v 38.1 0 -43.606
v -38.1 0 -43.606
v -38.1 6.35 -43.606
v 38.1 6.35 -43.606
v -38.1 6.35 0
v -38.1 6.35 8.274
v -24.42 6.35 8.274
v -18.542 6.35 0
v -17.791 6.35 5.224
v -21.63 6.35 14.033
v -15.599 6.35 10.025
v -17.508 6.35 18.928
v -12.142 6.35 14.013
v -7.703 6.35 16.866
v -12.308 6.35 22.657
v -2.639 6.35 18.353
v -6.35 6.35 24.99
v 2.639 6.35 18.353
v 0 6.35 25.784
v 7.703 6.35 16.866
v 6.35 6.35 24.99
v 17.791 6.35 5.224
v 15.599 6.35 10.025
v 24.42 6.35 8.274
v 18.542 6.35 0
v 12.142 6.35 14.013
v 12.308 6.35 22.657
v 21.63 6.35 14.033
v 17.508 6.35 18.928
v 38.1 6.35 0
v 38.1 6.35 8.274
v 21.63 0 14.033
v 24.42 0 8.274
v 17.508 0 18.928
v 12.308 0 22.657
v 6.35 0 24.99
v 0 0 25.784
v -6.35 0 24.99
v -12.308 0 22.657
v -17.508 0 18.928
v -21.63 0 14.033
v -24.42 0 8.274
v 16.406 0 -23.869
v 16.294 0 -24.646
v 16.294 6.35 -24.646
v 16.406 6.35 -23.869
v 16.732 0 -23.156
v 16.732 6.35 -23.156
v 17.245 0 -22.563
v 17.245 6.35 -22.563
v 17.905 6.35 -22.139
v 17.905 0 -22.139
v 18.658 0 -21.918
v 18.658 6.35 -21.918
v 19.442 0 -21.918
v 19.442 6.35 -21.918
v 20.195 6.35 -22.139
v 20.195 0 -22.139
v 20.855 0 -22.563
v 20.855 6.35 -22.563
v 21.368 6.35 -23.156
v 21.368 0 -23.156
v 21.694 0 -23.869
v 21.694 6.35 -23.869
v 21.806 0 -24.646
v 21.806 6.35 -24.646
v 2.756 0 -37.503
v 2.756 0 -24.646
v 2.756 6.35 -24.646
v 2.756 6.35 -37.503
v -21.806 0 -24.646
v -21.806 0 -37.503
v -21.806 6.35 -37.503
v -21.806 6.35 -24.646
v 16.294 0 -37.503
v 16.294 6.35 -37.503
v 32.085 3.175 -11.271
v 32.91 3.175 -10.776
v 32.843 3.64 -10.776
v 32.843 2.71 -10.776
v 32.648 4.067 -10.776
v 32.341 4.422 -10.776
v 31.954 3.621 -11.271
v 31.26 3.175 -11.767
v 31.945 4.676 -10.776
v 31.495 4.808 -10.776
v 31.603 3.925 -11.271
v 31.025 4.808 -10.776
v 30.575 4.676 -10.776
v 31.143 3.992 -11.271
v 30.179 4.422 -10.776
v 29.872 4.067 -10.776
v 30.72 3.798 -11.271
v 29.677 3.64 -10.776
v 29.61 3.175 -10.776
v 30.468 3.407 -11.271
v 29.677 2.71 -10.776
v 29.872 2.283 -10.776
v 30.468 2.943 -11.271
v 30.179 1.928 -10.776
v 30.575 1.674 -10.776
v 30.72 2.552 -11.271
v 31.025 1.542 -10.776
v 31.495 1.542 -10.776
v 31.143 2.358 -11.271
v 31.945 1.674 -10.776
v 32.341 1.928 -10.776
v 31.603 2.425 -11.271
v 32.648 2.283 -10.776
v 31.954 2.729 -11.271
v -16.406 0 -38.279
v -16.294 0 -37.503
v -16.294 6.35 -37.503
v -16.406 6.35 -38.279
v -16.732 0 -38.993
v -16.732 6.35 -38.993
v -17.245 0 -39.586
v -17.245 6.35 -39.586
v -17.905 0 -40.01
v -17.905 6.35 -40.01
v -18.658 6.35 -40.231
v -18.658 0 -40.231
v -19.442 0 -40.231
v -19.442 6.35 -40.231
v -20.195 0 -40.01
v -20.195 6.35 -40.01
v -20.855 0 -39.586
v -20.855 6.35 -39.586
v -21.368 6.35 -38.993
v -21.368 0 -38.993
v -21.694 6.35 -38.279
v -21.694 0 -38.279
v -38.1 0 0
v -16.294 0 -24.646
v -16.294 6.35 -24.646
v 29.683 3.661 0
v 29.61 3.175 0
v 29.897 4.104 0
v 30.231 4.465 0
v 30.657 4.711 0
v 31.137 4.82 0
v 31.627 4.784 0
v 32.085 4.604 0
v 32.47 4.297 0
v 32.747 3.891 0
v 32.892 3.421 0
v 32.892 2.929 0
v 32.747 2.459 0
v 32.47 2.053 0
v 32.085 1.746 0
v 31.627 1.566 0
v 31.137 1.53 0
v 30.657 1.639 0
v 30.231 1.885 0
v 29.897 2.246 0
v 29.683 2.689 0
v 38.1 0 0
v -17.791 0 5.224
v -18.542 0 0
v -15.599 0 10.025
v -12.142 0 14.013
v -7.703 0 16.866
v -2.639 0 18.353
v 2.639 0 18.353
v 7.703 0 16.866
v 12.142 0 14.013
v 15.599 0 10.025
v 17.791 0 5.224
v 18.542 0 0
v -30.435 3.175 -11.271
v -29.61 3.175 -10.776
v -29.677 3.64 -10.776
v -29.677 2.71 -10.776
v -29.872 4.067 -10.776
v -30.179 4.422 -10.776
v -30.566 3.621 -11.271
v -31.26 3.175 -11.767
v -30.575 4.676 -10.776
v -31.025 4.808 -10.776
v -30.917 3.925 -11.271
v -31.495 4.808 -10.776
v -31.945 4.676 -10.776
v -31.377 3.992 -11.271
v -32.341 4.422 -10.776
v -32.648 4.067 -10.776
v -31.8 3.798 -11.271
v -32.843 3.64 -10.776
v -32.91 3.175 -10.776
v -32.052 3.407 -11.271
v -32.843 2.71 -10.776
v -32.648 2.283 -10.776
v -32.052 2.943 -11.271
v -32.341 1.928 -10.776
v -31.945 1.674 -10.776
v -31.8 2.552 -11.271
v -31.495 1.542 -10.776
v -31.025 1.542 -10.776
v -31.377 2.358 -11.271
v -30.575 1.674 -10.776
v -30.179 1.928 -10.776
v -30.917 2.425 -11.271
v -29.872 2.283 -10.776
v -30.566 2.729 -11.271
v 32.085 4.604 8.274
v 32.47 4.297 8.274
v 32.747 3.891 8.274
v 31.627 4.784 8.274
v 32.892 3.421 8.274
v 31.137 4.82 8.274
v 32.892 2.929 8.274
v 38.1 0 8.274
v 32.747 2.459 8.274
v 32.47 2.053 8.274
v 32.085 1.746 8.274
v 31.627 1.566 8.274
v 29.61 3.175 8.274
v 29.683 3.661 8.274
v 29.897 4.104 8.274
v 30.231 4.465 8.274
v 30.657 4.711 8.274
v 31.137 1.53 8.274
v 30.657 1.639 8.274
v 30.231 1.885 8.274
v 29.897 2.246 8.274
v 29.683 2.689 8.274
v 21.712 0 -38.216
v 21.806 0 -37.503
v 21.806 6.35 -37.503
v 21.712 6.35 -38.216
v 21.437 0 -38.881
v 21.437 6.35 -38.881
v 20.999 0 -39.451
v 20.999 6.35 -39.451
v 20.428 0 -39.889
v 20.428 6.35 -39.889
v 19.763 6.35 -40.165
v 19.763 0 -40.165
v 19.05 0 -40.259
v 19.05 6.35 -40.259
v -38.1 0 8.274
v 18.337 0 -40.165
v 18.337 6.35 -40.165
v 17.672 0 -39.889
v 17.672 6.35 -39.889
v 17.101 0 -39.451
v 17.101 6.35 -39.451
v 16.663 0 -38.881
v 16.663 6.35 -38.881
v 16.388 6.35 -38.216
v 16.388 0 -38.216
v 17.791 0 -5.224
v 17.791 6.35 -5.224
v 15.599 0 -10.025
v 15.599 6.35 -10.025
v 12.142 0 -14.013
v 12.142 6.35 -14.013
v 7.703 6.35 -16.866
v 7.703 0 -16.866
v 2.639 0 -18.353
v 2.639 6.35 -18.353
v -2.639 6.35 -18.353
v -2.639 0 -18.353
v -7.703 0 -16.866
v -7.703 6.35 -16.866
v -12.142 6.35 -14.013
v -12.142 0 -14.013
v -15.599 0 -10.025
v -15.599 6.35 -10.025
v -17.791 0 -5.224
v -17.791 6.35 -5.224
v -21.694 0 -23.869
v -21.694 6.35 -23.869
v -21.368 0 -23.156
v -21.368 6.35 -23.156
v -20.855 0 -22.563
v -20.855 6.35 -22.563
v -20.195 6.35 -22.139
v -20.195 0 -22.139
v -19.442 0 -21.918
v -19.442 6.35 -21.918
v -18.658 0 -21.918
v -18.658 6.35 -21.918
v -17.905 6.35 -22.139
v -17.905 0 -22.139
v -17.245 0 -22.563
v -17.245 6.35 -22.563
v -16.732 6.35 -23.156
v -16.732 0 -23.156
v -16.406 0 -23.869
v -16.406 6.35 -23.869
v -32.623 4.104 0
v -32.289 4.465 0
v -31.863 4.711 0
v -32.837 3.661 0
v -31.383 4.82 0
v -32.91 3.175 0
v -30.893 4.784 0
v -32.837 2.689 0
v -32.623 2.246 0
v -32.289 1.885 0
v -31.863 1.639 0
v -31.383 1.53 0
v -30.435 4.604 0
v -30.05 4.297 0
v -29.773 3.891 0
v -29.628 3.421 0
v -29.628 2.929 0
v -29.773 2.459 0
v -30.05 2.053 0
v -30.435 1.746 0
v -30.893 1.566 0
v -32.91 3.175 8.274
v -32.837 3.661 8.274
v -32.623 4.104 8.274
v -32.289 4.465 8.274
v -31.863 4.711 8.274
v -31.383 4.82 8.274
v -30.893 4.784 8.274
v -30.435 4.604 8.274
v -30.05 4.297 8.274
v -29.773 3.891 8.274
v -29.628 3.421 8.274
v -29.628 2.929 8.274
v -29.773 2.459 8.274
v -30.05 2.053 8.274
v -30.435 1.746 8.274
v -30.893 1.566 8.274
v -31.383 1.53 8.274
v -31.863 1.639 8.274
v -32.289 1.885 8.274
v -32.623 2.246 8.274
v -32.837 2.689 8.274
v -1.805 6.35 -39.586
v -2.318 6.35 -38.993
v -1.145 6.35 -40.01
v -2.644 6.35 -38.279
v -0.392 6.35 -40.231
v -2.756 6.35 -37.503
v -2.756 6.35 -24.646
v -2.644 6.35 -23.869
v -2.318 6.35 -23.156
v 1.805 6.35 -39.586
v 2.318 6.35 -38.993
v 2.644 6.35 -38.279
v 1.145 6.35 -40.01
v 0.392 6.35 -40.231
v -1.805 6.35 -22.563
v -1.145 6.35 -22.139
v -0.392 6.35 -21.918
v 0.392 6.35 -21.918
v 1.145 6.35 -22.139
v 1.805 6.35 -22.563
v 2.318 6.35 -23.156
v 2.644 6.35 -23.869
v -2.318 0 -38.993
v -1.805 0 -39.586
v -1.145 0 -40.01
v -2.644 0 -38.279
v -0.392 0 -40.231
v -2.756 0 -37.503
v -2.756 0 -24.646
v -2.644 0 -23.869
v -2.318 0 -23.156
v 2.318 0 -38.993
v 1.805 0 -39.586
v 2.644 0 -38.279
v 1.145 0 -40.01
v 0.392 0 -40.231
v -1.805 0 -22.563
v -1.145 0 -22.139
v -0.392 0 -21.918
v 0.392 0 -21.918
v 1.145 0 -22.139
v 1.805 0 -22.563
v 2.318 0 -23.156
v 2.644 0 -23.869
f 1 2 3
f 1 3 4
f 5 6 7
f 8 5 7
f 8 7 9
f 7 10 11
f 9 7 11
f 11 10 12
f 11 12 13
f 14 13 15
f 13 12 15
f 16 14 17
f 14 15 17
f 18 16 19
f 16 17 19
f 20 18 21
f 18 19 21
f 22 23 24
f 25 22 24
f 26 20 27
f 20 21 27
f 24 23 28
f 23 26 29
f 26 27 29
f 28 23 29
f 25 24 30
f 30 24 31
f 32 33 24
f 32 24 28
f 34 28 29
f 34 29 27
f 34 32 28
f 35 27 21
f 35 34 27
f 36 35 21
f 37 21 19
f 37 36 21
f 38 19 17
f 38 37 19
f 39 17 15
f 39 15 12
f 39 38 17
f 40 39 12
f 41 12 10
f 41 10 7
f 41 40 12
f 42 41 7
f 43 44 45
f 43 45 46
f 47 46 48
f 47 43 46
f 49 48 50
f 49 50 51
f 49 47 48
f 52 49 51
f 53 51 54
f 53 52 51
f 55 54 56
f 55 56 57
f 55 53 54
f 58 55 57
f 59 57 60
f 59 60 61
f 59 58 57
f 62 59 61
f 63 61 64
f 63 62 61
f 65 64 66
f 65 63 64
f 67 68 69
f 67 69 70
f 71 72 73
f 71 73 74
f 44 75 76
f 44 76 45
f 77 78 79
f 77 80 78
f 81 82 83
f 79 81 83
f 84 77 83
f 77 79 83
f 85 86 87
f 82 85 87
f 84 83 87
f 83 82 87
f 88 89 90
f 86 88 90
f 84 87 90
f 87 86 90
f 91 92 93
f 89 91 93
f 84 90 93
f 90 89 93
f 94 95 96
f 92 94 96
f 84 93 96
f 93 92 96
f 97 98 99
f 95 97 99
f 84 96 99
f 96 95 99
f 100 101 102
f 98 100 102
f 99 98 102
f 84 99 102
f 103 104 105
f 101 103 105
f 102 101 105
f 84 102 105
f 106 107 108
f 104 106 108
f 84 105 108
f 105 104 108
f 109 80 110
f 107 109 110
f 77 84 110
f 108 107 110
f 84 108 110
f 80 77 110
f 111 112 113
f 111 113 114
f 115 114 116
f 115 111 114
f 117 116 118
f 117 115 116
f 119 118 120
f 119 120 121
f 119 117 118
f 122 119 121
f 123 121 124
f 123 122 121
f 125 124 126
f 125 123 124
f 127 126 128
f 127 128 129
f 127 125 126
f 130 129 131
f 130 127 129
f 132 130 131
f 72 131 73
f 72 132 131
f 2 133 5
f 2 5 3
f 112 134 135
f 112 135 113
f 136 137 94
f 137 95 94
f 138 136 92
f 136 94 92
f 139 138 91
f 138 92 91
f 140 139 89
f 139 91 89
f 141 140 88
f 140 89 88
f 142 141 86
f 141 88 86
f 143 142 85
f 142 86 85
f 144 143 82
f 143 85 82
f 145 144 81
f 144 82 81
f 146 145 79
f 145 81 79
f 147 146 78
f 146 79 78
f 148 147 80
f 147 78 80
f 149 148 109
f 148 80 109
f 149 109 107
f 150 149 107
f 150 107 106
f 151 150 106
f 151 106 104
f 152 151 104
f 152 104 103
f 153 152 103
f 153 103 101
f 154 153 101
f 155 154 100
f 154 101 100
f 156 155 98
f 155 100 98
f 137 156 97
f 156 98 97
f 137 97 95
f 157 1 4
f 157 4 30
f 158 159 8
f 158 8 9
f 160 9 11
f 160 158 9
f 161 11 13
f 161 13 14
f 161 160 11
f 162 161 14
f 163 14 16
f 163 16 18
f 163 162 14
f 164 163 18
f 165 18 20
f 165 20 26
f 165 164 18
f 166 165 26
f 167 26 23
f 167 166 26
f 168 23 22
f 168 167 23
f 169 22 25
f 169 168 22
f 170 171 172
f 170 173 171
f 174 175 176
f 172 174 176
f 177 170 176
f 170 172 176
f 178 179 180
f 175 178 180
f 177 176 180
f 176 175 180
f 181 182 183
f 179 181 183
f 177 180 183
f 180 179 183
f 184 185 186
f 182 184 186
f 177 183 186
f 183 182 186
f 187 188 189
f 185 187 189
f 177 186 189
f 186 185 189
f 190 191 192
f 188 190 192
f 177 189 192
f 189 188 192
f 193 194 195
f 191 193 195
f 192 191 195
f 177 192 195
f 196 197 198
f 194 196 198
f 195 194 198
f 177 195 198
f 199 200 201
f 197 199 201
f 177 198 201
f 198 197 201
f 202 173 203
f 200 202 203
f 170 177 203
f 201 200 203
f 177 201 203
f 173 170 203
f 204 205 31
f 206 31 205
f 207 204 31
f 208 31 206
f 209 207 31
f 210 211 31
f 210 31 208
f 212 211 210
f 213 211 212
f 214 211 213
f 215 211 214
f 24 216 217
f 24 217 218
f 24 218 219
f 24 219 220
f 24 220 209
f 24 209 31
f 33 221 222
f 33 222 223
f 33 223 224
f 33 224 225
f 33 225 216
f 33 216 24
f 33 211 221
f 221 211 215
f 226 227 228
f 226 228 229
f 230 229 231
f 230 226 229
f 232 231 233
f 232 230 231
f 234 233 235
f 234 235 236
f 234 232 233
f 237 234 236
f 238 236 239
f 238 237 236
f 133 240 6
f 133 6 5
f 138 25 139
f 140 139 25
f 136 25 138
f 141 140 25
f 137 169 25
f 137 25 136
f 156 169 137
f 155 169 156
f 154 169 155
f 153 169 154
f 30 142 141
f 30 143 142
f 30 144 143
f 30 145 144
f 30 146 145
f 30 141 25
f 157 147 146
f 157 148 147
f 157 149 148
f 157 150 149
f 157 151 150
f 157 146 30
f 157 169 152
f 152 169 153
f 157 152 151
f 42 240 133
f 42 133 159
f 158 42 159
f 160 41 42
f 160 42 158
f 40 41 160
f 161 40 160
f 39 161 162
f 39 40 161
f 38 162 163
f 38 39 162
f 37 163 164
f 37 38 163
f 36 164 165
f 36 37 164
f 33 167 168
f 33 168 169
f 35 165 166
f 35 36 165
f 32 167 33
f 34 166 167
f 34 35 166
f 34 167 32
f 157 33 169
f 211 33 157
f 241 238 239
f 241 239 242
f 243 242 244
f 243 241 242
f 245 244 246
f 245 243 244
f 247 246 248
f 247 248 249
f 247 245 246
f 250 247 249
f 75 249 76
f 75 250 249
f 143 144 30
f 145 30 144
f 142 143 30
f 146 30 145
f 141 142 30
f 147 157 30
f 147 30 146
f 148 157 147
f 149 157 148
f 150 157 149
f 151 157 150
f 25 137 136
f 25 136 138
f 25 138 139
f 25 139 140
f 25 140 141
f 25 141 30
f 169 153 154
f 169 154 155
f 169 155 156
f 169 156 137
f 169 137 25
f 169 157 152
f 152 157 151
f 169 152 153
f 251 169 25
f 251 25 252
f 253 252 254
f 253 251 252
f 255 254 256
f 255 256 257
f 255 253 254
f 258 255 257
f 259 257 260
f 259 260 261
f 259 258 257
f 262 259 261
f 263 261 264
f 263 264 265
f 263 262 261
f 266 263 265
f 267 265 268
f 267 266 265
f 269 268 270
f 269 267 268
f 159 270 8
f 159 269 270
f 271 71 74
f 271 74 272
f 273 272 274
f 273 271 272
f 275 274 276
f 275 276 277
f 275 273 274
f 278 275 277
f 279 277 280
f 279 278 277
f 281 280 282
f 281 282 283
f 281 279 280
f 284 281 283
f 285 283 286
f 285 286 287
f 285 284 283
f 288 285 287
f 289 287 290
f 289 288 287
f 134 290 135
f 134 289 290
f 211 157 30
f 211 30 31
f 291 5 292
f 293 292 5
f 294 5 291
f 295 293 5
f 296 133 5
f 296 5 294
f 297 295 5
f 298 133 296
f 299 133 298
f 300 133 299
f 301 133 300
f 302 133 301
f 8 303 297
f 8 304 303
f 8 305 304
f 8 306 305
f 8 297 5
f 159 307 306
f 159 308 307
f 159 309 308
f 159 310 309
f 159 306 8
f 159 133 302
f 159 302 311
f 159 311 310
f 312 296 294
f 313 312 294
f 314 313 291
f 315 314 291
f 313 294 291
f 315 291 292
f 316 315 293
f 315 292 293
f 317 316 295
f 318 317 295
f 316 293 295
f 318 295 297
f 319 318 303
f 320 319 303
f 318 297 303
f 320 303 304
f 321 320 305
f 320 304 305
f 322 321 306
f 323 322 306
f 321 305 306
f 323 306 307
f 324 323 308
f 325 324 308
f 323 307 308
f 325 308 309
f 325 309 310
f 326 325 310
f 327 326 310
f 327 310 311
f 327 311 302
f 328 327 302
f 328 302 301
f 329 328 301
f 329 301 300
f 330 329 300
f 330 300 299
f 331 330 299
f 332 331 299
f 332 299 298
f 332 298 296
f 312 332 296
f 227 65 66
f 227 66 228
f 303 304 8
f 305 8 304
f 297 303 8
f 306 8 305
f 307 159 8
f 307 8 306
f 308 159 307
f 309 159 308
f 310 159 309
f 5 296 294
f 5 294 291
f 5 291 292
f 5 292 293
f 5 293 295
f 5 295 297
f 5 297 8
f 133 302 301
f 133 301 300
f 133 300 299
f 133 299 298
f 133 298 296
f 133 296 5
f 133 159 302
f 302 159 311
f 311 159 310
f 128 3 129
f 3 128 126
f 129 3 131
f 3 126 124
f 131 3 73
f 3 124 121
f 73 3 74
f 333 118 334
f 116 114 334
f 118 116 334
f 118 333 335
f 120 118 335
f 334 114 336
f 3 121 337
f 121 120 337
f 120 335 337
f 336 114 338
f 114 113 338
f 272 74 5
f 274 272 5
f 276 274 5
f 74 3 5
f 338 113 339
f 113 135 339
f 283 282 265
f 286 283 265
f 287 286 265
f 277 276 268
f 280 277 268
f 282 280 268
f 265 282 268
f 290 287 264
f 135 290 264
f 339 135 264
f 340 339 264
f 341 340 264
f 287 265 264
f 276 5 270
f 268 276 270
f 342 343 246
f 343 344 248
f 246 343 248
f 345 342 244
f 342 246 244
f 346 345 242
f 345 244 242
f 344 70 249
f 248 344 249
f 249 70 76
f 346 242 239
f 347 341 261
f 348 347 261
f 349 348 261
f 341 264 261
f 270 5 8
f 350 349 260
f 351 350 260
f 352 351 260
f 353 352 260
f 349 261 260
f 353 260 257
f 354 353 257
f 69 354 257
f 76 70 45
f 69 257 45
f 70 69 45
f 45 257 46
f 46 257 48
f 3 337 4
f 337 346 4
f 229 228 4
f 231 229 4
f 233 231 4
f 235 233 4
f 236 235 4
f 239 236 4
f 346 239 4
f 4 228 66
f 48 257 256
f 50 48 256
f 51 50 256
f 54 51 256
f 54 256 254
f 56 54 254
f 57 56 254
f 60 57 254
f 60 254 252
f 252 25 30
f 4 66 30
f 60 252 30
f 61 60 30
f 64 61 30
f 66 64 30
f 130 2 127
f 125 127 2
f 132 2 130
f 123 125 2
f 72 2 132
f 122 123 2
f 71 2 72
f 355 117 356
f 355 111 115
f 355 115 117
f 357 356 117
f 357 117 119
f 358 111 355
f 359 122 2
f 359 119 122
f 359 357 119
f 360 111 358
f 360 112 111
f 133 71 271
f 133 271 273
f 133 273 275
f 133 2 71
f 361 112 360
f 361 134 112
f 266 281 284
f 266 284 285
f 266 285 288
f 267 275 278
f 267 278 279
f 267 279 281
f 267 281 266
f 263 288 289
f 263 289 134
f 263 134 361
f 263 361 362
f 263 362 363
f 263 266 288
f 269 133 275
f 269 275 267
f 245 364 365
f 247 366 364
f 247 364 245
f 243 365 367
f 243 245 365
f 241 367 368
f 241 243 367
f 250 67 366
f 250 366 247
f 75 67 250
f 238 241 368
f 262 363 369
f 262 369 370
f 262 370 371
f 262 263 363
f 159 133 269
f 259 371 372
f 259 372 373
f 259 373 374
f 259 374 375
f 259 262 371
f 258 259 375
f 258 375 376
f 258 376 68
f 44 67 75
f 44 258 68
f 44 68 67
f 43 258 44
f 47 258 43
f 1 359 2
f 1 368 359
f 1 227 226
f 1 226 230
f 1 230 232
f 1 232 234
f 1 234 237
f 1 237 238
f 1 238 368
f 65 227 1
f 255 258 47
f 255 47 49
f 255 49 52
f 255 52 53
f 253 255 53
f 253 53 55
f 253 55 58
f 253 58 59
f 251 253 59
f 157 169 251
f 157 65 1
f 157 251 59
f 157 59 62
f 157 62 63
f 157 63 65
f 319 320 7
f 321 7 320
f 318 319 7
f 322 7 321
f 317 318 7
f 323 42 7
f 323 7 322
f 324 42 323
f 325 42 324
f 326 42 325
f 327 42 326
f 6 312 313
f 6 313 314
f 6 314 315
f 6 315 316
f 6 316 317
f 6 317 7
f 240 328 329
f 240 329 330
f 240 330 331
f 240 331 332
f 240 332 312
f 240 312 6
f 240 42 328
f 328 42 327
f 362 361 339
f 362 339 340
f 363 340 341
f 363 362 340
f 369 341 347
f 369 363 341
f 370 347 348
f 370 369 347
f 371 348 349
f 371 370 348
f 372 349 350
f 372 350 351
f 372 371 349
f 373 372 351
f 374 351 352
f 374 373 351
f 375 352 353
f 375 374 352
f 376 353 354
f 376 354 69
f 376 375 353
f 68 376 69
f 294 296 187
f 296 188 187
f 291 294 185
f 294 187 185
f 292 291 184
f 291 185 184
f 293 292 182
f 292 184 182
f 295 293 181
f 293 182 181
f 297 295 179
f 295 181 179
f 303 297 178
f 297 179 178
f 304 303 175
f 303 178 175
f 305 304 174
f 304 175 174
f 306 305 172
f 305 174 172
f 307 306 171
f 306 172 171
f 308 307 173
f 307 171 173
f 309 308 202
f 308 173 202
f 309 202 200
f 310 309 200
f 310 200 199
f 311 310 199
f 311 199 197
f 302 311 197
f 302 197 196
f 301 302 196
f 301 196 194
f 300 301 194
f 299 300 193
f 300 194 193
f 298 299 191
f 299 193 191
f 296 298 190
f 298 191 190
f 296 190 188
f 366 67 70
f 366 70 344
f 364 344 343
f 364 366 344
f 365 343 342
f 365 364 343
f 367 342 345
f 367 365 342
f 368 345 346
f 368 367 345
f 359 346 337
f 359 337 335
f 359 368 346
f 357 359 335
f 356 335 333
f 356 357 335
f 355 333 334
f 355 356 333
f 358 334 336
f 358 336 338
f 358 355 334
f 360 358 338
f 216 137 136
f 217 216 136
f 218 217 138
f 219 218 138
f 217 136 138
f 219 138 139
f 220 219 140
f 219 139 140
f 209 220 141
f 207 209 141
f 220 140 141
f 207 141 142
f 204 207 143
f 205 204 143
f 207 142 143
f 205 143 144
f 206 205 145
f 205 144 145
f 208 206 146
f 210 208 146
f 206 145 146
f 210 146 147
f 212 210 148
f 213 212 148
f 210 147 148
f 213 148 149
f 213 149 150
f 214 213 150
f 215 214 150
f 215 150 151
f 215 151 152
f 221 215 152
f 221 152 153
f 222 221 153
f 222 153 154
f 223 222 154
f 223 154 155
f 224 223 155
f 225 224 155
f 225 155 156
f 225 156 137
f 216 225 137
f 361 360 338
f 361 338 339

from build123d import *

# Parameters (mm, degrees)
F1_DEPTH         = 6.35
F2_DEPTH         = 6.35
F5_D             = 3.3
F5_DEPTH         = 19.05
F5_TIP           = 0.9914200214
F5_2_D           = 3.3
F5_2_DEPTH       = 19.05
F5_2_TIP         = 0.9914200214
F5_ON_F4_D       = 3.3
F5_ON_F4_DEPTH   = 19.05
F5_ON_F4_TIP     = 0.9914200214
F5_ON_F4_2_D     = 3.3
F5_ON_F4_2_DEPTH = 19.05
F5_ON_F4_2_TIP   = 0.9914200214


# Not quite as in the source:
# - a feature names something its author has since deleted; it is built from what else it names


with BuildPart() as f1:
    # F0 (on Front) → F1 (new body)
    with BuildSketch(Plane.XZ):
        with BuildLine():
            Line((-38.1, 0), (-38.1, -43.6063950042))
            Line((-38.1, -43.6063950042), (0, -43.6063950042))
            Line((0, -43.6063950042), (19.05, -43.6063950042))
            Line((19.05, -43.6063950042), (38.1, -43.6063950042))
            Line((38.1, -43.6063950042), (38.1, 0))
            Line((38.1, 0), (18.542, 0))
            ThreePointArc((18.542, 0), (0, -18.542), (-18.542, 0))
            Line((-18.542, 0), (-38.1, 0))
        make_face()
        with BuildLine():
            ThreePointArc((-21.8059, -24.6456172317), (-19.05, -21.8897172317), (-16.2941, -24.6456172317))
            Line((-16.2941, -24.6456172317), (-16.2941, -37.5027777724))
            ThreePointArc((-16.2941, -37.5027777724), (-19.05, -40.2586777724), (-21.8059, -37.5027777724))
            Line((-21.8059, -37.5027777724), (-21.8059, -24.6456172317))
        make_face(mode=Mode.SUBTRACT)
        with BuildLine():
            ThreePointArc((-2.7559, -24.6456172317), (0, -21.8897172317), (2.7559, -24.6456172317))
            Line((2.7559, -24.6456172317), (2.7559, -37.5027777724))
            ThreePointArc((2.7559, -37.5027777724), (0, -40.2586777724), (-2.7559, -37.5027777724))
            Line((-2.7559, -37.5027777724), (-2.7559, -24.6456172317))
        make_face(mode=Mode.SUBTRACT)
        with BuildLine():
            ThreePointArc((21.8059, -37.5027777724), (20.9987155783, -39.4514933507), (19.05, -40.2586777724))
            ThreePointArc((19.05, -40.2586777724), (17.1012844217, -39.4514933507), (16.2941, -37.5027777724))
            Line((16.2941, -37.5027777724), (16.2941, -24.6456172317))
            ThreePointArc((16.2941, -24.6456172317), (19.05, -21.8897172317), (21.8059, -24.6456172317))
            Line((21.8059, -24.6456172317), (21.8059, -37.5027777724))
        make_face(mode=Mode.SUBTRACT)
    extrude(amount=-F1_DEPTH)

    # F5
    with Locations(Plane.XY.offset(8.2744888681)):
        with Locations((-31.260012702, 3.175)):
            Hole(F5_D / 2, depth=F5_DEPTH)
            with Locations((0, 0, -(F5_DEPTH + F5_TIP / 2))):  # 118° drill point
                Cone(0, F5_D / 2, F5_TIP, mode=Mode.SUBTRACT)

    # F5 on F4
    with Locations(Plane.XY.offset(8.2744888681)):
        with Locations((31.260012702, 3.175)):
            Hole(F5_ON_F4_D / 2, depth=F5_ON_F4_DEPTH)
            with Locations((0, 0, -(F5_ON_F4_DEPTH + F5_ON_F4_TIP / 2))):  # 118° drill point
                Cone(0, F5_ON_F4_D / 2, F5_ON_F4_TIP, mode=Mode.SUBTRACT)


with BuildPart() as f2:
    # F0 (on Front) → F2 (new body)
    with BuildSketch(Plane.XZ):
        with BuildLine():
            Line((-38.1, 8.2744888681), (-38.1, 0))
            Line((-38.1, 0), (-18.542, 0))
            ThreePointArc((-18.542, 0), (0, 18.542), (18.542, 0))
            Line((18.542, 0), (38.1, 0))
            Line((38.1, 0), (38.1, 8.2744888681))
            Line((38.1, 8.2744888681), (24.4200254041, 8.2744888681))
            ThreePointArc((24.4200254041, 8.2744888681), (0, 25.7838090042), (-24.4200254041, 8.2744888681))
            Line((-24.4200254041, 8.2744888681), (-38.1, 8.2744888681))
        make_face()
    extrude(amount=-F2_DEPTH)

    # F5#2
    with Locations(Plane.XY.offset(8.2744888681)):
        with Locations((-31.260012702, 3.175)):
            Hole(F5_2_D / 2, depth=F5_2_DEPTH)
            with Locations((0, 0, -(F5_2_DEPTH + F5_2_TIP / 2))):  # 118° drill point
                Cone(0, F5_2_D / 2, F5_2_TIP, mode=Mode.SUBTRACT)

    # F5 on F4#2
    with Locations(Plane.XY.offset(8.2744888681)):
        with Locations((31.260012702, 3.175)):
            Hole(F5_ON_F4_2_D / 2, depth=F5_ON_F4_2_DEPTH)
            with Locations((0, 0, -(F5_ON_F4_2_DEPTH + F5_ON_F4_2_TIP / 2))):  # 118° drill point
                Cone(0, F5_ON_F4_2_D / 2, F5_ON_F4_2_TIP, mode=Mode.SUBTRACT)


solid = Compound([f1.part, f2.part])
